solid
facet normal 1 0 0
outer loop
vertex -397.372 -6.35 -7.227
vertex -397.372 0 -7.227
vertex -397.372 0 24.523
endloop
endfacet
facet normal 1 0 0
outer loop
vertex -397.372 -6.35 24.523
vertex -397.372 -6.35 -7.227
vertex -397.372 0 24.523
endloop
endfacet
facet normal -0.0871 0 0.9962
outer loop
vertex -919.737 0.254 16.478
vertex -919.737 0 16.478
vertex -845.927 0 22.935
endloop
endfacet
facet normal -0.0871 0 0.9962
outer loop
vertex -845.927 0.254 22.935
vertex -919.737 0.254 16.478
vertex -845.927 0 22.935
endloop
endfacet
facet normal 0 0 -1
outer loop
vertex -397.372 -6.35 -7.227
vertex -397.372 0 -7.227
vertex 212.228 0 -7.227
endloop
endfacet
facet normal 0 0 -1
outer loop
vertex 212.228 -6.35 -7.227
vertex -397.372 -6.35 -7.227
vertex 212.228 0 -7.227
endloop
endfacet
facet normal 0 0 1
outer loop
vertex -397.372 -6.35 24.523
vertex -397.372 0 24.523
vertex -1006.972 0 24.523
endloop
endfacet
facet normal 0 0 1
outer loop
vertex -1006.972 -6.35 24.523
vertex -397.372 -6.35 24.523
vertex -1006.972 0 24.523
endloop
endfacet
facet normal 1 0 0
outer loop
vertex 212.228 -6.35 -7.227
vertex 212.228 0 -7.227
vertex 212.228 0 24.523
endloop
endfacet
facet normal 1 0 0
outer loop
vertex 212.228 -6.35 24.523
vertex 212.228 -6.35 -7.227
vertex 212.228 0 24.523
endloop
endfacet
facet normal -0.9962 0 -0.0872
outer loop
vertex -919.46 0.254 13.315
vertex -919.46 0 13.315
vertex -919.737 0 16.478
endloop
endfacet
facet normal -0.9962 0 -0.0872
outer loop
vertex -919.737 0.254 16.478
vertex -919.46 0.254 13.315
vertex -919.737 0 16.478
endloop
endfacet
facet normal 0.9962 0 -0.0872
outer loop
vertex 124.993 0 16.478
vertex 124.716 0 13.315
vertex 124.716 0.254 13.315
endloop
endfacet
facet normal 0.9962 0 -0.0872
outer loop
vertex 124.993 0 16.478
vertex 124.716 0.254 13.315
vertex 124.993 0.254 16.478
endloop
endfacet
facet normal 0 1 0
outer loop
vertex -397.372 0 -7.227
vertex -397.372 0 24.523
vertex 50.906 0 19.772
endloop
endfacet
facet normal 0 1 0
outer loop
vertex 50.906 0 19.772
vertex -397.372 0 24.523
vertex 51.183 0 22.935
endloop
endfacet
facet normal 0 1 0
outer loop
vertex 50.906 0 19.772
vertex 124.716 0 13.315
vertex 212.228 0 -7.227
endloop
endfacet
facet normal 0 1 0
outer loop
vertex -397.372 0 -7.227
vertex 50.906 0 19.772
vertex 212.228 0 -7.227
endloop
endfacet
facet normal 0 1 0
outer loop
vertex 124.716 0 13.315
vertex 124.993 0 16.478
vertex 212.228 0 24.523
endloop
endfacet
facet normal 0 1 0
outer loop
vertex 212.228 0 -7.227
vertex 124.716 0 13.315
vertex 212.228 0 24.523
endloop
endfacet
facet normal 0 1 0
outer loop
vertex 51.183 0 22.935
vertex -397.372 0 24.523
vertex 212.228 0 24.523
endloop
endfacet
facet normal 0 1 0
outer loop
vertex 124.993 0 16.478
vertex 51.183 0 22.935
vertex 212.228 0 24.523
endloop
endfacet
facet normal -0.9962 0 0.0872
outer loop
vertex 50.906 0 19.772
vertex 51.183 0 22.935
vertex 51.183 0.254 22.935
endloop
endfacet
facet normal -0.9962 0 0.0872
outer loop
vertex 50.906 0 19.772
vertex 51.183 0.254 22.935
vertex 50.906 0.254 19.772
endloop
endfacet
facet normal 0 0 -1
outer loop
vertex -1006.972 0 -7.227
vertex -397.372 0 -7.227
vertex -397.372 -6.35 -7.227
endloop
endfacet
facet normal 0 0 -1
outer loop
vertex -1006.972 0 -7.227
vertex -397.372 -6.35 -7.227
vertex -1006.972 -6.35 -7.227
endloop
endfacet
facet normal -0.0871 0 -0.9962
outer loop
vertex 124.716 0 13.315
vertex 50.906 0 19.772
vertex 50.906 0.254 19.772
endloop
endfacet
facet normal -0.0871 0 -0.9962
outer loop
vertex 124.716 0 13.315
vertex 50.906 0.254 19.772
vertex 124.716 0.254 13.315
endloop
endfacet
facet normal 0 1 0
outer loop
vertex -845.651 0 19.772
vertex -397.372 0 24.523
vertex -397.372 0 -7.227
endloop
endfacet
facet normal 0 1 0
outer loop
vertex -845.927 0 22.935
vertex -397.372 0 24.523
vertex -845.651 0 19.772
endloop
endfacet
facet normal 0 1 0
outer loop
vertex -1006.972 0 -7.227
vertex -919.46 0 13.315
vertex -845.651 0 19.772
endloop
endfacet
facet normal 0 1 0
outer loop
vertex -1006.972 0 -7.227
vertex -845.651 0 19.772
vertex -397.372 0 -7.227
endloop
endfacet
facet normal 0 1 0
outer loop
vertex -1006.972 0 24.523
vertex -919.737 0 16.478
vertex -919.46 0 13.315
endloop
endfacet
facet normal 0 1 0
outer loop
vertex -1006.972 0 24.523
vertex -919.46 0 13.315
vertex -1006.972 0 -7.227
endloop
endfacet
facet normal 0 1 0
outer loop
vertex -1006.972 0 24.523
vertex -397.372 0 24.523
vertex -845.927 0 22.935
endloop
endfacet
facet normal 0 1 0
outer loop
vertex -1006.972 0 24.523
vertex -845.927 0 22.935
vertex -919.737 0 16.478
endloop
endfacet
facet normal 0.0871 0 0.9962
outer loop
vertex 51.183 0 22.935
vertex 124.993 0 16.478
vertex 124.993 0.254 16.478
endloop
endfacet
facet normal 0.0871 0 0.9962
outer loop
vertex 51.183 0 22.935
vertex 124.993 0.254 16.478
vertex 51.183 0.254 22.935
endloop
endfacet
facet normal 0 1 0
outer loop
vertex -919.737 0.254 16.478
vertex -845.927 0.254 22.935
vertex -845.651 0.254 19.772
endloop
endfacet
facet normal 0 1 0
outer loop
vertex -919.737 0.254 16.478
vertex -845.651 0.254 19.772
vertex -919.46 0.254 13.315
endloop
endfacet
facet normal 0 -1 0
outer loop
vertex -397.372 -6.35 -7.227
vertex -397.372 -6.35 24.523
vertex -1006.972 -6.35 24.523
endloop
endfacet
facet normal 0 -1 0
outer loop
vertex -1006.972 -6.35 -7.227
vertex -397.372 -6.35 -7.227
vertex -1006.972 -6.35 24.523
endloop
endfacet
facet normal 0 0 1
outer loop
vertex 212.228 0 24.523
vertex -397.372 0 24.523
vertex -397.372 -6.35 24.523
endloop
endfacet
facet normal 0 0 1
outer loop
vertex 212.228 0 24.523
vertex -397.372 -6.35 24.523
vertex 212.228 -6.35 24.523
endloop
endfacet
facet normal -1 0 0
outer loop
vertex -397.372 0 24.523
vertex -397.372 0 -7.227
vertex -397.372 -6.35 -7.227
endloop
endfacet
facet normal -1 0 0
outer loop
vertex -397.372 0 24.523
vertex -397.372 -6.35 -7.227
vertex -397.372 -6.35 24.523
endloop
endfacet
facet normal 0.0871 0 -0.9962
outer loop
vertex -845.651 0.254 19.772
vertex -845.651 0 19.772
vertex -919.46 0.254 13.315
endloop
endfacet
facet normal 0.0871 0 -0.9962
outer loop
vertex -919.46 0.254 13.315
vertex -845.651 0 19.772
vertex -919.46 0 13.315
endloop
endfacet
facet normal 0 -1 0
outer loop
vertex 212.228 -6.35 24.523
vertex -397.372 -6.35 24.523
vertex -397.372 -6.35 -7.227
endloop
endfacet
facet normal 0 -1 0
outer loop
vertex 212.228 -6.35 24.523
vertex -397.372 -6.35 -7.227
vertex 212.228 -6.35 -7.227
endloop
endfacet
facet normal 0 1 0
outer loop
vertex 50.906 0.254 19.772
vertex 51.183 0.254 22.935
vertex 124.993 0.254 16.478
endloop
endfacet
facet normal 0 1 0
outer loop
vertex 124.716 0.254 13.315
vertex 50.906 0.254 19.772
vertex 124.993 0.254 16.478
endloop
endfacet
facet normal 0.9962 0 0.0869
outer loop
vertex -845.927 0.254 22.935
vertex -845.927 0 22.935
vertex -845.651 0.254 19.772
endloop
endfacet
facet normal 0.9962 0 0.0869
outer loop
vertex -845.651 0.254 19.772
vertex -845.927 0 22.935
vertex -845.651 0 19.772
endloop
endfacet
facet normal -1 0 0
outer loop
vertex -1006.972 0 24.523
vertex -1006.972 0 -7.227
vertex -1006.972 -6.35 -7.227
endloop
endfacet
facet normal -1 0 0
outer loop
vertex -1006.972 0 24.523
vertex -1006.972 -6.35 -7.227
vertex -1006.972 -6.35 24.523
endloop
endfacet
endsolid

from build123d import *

# Parameters (mm, degrees)
F0_W     = 609.6
F0_H     = 31.75
F1_DEPTH = 6.35
F3_DEPTH = 0.254


with BuildPart() as f1:
    # F0 (on Front) → F1 (new body)
    with BuildSketch(Plane.XZ):
        with Locations((-92.572312, 8.647628)):
            Rectangle(F0_W, F0_H)
        Polygon((-103.370848, 16.477617), (-29.560988, 22.935128), (-29.28427, 19.772209), (-103.094129, 13.314699), align=None, mode=Mode.SUBTRACT)
        Polygon((50.905979, 19.772209), (51.182697, 22.935128), (124.992557, 16.477617), (124.715838, 13.314699), align=None, mode=Mode.SUBTRACT)
        Polygon((-29.28427, 19.772209), (-29.560988, 22.935128), (-103.370848, 16.477617), (-103.094129, 13.314699), align=None)
        Polygon((124.992557, 16.477617), (51.182697, 22.935128), (50.905979, 19.772209), (124.715838, 13.314699), align=None)
    extrude(amount=F1_DEPTH)

    # F0 (on Front) → F3 (join)
    with BuildSketch(Plane.XZ):
        Polygon((124.992557, 16.477617), (51.182697, 22.935128), (50.905979, 19.772209), (124.715838, 13.314699), align=None)
    extrude(amount=-F3_DEPTH)


with BuildPart() as f2_1:
    # F2: instance of F1
    add(f1.part.mirror(Plane(origin=(-397.372312, -3.175, 8.647628), x_dir=(0, -1, 0), z_dir=(-1, 0, 0))))


with BuildPart() as f5_1:
    # F5: instance of F1
    add(f1.part.mirror(Plane(origin=(-397.372312, -3.175, 8.647628), x_dir=(0, -1, 0), z_dir=(-1, 0, 0))))


solid = Compound([f1.part, f5_1.part])
